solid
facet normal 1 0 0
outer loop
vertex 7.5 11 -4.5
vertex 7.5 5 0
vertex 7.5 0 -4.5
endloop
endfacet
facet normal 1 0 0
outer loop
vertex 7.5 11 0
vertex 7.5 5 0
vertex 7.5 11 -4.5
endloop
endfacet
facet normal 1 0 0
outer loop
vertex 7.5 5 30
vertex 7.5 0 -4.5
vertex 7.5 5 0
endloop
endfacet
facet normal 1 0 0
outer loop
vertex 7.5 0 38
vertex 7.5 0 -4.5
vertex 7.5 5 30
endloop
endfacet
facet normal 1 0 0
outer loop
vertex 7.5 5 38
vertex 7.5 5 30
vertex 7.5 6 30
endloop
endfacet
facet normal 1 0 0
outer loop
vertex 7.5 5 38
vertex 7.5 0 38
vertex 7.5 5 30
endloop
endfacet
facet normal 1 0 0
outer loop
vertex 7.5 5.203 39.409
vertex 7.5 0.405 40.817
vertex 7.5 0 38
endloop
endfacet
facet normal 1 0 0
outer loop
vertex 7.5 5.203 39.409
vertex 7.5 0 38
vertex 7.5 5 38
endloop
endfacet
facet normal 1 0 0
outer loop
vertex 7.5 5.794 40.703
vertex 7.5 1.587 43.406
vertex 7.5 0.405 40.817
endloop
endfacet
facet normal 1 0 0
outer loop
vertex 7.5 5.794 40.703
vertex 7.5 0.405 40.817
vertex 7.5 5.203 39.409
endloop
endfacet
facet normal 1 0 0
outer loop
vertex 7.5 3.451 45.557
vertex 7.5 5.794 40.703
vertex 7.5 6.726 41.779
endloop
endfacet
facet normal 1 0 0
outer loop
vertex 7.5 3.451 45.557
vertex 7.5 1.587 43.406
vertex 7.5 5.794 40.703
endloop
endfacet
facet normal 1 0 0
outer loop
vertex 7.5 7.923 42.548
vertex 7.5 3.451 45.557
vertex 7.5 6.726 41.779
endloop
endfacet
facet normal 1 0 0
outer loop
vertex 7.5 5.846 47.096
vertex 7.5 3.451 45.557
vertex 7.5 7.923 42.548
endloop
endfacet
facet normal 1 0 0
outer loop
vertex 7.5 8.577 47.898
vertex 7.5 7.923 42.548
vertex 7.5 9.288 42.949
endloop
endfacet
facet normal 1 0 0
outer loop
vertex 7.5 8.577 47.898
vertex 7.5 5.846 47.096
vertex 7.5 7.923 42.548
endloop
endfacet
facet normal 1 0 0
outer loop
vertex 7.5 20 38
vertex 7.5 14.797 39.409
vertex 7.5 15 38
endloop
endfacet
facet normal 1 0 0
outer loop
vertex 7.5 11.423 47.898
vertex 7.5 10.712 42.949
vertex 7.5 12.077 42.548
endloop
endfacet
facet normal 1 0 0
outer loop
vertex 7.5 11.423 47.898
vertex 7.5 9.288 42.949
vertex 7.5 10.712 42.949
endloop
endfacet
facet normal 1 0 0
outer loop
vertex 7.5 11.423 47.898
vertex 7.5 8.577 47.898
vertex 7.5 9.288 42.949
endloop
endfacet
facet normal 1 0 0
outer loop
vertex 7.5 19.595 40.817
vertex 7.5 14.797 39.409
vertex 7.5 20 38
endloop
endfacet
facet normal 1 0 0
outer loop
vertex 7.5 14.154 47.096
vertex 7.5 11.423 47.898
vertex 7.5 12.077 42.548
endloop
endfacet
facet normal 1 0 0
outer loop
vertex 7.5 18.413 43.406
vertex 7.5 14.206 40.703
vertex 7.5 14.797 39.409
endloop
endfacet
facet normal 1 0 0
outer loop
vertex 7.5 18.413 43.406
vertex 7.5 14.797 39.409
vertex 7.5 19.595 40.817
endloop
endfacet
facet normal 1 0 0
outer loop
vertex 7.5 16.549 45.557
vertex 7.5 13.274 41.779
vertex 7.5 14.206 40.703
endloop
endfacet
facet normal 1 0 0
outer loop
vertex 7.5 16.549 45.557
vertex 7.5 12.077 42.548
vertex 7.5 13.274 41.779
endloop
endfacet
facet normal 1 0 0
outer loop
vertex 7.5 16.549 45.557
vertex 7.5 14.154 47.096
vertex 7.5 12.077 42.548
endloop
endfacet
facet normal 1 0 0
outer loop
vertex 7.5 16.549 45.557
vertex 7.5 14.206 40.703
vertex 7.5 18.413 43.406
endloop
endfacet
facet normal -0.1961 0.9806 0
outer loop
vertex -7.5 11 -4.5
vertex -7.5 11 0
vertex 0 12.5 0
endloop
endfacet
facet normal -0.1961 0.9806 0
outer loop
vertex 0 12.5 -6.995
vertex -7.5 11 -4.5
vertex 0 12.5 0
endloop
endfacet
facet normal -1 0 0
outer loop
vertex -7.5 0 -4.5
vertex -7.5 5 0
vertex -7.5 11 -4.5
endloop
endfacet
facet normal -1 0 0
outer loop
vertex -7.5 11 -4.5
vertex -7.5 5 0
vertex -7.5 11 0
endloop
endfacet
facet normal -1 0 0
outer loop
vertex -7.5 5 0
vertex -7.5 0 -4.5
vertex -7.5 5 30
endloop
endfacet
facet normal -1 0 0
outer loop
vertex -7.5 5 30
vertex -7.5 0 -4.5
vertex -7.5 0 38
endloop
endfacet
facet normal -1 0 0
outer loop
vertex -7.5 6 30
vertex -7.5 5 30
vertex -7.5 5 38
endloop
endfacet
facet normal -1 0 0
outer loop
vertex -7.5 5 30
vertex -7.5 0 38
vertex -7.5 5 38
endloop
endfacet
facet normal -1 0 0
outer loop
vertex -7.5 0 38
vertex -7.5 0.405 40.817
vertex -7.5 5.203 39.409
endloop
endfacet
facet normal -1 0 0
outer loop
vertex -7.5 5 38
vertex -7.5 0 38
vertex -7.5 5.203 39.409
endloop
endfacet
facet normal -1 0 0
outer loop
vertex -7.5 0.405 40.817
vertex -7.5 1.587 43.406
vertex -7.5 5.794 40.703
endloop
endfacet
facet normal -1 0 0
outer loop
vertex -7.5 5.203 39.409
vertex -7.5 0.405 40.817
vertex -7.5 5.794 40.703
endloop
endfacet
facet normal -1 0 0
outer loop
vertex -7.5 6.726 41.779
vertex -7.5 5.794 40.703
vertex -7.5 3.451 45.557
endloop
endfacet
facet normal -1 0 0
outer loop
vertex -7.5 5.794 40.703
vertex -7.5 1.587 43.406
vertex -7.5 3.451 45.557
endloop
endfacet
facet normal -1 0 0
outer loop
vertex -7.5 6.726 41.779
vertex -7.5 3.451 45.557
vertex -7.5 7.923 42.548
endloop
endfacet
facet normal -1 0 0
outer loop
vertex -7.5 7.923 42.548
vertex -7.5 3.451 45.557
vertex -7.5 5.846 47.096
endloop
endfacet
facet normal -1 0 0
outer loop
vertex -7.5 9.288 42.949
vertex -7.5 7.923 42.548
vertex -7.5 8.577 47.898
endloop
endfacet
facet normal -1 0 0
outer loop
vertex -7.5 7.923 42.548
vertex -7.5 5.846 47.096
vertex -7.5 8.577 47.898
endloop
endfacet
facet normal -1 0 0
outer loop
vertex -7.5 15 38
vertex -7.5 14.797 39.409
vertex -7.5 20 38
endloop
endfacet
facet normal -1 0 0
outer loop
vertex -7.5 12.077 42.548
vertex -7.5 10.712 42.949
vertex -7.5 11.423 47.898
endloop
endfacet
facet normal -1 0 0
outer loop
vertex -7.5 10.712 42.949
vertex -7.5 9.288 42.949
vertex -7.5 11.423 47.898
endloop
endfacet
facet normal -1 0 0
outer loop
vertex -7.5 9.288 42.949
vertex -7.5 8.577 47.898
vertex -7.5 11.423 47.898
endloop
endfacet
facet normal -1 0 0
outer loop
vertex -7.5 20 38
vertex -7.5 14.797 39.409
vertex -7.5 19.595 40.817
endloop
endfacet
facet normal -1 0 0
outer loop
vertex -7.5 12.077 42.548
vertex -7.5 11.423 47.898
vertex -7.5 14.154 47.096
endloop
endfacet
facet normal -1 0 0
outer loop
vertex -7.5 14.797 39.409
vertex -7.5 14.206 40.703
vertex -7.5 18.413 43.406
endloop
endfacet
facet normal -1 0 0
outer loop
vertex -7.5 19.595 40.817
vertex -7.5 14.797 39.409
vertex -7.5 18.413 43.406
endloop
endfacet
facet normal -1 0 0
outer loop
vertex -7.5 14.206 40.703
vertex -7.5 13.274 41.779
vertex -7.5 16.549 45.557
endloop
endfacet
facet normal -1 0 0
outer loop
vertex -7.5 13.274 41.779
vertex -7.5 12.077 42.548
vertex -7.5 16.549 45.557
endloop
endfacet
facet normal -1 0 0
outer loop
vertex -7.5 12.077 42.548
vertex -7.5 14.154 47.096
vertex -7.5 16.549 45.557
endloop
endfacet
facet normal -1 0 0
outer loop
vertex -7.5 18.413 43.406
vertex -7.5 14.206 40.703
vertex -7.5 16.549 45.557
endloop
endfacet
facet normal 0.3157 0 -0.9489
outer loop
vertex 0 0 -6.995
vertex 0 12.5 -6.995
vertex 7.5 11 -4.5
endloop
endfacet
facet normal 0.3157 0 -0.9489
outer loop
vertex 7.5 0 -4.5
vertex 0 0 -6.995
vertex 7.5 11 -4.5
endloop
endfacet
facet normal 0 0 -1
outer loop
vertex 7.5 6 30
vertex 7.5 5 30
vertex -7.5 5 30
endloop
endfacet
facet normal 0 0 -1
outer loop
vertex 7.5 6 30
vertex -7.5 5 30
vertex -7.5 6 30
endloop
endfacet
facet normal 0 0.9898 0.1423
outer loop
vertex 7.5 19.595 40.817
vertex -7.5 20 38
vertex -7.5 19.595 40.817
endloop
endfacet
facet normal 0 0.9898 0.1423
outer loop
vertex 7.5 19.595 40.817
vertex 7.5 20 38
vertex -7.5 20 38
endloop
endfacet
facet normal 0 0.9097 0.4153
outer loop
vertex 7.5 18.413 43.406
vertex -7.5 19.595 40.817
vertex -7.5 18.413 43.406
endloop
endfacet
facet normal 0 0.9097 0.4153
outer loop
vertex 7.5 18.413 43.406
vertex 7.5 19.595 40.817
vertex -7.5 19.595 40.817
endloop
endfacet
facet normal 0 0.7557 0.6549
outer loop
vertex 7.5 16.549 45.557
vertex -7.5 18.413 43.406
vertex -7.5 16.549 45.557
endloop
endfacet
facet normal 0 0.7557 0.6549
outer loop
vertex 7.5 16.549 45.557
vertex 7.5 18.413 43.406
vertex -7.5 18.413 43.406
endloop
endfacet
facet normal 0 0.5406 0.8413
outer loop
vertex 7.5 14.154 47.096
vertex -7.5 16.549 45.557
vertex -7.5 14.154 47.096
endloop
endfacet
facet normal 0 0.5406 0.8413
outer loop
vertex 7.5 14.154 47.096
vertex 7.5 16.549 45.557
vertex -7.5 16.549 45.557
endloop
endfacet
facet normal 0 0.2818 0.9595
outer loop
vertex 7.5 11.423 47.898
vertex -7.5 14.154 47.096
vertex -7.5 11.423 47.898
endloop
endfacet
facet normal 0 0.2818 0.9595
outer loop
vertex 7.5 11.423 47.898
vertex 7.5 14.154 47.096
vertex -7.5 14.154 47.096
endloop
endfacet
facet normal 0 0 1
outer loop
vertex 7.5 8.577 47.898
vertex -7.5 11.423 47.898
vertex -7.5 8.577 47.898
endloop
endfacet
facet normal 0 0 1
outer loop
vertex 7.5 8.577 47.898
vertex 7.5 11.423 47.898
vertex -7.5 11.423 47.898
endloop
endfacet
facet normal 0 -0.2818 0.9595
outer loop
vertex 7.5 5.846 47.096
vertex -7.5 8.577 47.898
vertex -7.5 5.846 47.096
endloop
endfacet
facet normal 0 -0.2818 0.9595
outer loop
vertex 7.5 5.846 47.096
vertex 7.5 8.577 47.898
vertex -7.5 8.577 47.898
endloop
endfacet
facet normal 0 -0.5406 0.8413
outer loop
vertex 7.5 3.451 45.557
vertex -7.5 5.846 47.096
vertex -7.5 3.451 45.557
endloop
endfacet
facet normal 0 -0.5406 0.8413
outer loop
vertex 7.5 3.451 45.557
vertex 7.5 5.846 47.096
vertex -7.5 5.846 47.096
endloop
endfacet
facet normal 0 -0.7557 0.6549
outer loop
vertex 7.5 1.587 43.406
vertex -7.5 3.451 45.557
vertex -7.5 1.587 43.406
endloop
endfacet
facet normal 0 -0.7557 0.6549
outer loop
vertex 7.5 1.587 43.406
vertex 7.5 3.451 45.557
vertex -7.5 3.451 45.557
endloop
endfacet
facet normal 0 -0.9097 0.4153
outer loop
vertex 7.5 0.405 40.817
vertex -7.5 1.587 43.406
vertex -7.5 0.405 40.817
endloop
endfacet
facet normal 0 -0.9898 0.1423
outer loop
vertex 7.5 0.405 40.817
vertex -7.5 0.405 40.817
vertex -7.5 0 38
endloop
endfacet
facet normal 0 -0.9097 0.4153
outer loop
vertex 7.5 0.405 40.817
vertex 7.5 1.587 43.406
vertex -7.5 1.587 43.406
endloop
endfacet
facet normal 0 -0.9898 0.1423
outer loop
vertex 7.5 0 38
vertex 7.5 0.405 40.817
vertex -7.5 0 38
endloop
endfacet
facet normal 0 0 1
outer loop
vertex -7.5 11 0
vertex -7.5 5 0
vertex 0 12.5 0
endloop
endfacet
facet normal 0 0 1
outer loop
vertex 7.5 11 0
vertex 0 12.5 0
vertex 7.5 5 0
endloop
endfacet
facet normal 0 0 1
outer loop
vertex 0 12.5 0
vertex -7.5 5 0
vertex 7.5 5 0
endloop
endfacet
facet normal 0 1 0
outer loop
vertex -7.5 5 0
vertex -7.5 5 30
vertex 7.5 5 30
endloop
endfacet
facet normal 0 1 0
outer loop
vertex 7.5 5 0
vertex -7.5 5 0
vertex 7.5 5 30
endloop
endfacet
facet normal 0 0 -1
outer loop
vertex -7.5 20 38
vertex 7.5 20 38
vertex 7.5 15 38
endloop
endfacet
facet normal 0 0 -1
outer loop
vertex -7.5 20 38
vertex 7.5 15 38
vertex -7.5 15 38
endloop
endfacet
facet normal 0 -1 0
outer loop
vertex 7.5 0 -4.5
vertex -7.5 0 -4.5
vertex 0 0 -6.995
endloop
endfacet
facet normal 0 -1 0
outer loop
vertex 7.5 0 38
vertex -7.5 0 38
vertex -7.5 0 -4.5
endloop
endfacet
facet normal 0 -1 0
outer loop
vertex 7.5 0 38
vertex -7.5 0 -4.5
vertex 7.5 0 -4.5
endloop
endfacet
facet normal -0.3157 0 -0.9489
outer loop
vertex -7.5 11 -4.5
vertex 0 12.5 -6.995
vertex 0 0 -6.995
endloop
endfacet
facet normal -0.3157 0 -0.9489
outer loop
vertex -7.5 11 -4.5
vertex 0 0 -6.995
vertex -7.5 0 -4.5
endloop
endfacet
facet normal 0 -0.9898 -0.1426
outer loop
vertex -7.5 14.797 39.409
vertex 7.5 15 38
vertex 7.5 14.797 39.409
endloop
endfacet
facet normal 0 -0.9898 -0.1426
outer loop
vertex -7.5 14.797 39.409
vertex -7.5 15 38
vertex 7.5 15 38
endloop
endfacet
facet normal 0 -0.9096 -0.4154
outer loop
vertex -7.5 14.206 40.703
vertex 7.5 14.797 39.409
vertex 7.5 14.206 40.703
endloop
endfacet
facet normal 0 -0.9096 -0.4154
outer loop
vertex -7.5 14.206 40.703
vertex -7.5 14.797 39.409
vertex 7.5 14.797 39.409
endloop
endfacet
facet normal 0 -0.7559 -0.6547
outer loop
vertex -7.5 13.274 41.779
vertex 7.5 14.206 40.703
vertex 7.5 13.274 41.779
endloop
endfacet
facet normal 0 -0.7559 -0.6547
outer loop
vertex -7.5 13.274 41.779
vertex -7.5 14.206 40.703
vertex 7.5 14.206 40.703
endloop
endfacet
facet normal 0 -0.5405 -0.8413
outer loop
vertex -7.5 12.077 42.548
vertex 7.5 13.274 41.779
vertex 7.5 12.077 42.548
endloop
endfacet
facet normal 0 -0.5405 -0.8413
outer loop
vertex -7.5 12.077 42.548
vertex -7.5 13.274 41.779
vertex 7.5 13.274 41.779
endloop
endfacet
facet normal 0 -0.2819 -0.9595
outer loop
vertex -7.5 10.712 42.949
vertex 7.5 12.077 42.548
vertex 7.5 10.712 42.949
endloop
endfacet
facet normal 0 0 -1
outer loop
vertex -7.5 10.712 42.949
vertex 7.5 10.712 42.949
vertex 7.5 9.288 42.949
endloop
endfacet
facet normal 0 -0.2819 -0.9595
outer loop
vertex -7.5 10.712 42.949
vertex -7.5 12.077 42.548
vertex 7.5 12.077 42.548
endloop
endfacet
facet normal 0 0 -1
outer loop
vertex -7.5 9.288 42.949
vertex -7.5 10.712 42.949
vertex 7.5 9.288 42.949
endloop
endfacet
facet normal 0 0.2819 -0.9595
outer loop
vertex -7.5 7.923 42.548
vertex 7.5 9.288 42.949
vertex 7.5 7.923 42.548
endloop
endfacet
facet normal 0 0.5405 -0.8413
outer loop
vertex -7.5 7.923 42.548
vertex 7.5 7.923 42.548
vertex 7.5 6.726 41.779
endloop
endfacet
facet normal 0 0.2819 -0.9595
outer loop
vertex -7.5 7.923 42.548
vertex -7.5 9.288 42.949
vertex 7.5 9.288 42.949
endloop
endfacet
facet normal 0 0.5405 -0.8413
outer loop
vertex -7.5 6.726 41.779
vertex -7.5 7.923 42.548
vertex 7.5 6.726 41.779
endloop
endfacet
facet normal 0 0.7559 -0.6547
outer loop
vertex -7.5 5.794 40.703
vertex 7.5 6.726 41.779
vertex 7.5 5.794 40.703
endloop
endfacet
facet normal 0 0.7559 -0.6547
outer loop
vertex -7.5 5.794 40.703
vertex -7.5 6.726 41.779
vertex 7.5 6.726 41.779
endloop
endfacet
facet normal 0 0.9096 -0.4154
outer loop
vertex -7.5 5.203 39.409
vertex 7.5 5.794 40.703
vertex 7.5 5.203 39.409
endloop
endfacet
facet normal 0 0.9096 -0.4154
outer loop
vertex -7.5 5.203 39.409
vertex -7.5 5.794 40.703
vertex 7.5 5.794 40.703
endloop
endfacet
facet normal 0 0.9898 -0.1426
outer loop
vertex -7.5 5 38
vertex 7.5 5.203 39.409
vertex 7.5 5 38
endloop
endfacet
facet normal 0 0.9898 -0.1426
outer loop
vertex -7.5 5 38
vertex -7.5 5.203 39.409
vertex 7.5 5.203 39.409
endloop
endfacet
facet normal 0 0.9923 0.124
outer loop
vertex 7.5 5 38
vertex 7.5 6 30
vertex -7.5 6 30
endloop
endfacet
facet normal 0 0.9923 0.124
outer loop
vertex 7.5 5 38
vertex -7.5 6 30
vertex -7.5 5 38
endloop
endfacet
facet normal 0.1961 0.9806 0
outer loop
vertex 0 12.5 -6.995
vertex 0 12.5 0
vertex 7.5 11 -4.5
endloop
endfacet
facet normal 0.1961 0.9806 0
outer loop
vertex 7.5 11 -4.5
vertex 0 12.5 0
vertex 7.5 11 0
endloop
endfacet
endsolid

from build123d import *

# Parameters (mm, degrees)
F0_W        = 15
F0_H        = 5
F1_DEPTH    = 38
F2_W        = 15
F2_H        = 5
F3_DEPTH    = 7
F4_T1_DEPTH = 50.0054850444
F1_FACE1_W  = 15
F1_FACE1_H  = 5
F8_DEPTH    = 15


# Not quite as in the source:
# - a fillet or chamfer that OpenCascade refuses, or shapes differently, is made with other operations: its cross-section is extruded or revolved along the edge and cut away or added


with BuildPart() as f1:
    # F0 (on Top) → F1 (new body)
    with BuildSketch(Plane.XY):
        with Locations((0, 2.5)):
            Rectangle(F0_W, F0_H)
    extrude(amount=F1_DEPTH)

    # F2 (on face) → F3 (join)
    with BuildSketch(Plane(origin=(0, 0, 0), x_dir=(1, 0, 0), z_dir=(0, 0, -1))):
        Polygon((7.5, -10), (7.5, -5), (-7.5, -5), (-7.5, -10), (-7.5, -11), (0, -12.5), (7.5, -11), align=None)
        with Locations((0, -2.5)):
            Rectangle(F2_W, F2_H)
    extrude(amount=F3_DEPTH)

    # F4: chamfer of 2.5 x 7.5152772587 on 2 edges, made by hand

    # F4_s2 → F4_t1 (cut)
    with BuildSketch(Plane.XZ.offset(-30.5027425222)):
        Polygon((0.0152772587, -7), (-7.5, -4.5), (-7.5, -7), align=None)
        Polygon((-0.0152772587, -7), (7.5, -4.5), (7.5, -7), align=None)
    extrude(amount=F4_T1_DEPTH, mode=Mode.SUBTRACT)

    # F6: sweep along a path in F5
    with BuildLine(Plane.YZ.offset(7.5)) as f6_path:
        ThreePointArc((17.5, 38), (10, 45.5), (2.5, 38))
    # F1_face1 (on face) → F6 (sweep)
    with BuildSketch(Plane(origin=(0, 2.5, 38), x_dir=(1, 0, 0), z_dir=(0, 0, 1))):
        Rectangle(F1_FACE1_W, F1_FACE1_H)
    sweep(path=f6_path.line)

    # F7 (on face) → F8 (join)
    with BuildSketch(Plane.YZ.offset(7.5)):
        Polygon((6, 30), (5, 38), (5, 30), align=None)
    extrude(amount=-F8_DEPTH)


solid = f1.part
